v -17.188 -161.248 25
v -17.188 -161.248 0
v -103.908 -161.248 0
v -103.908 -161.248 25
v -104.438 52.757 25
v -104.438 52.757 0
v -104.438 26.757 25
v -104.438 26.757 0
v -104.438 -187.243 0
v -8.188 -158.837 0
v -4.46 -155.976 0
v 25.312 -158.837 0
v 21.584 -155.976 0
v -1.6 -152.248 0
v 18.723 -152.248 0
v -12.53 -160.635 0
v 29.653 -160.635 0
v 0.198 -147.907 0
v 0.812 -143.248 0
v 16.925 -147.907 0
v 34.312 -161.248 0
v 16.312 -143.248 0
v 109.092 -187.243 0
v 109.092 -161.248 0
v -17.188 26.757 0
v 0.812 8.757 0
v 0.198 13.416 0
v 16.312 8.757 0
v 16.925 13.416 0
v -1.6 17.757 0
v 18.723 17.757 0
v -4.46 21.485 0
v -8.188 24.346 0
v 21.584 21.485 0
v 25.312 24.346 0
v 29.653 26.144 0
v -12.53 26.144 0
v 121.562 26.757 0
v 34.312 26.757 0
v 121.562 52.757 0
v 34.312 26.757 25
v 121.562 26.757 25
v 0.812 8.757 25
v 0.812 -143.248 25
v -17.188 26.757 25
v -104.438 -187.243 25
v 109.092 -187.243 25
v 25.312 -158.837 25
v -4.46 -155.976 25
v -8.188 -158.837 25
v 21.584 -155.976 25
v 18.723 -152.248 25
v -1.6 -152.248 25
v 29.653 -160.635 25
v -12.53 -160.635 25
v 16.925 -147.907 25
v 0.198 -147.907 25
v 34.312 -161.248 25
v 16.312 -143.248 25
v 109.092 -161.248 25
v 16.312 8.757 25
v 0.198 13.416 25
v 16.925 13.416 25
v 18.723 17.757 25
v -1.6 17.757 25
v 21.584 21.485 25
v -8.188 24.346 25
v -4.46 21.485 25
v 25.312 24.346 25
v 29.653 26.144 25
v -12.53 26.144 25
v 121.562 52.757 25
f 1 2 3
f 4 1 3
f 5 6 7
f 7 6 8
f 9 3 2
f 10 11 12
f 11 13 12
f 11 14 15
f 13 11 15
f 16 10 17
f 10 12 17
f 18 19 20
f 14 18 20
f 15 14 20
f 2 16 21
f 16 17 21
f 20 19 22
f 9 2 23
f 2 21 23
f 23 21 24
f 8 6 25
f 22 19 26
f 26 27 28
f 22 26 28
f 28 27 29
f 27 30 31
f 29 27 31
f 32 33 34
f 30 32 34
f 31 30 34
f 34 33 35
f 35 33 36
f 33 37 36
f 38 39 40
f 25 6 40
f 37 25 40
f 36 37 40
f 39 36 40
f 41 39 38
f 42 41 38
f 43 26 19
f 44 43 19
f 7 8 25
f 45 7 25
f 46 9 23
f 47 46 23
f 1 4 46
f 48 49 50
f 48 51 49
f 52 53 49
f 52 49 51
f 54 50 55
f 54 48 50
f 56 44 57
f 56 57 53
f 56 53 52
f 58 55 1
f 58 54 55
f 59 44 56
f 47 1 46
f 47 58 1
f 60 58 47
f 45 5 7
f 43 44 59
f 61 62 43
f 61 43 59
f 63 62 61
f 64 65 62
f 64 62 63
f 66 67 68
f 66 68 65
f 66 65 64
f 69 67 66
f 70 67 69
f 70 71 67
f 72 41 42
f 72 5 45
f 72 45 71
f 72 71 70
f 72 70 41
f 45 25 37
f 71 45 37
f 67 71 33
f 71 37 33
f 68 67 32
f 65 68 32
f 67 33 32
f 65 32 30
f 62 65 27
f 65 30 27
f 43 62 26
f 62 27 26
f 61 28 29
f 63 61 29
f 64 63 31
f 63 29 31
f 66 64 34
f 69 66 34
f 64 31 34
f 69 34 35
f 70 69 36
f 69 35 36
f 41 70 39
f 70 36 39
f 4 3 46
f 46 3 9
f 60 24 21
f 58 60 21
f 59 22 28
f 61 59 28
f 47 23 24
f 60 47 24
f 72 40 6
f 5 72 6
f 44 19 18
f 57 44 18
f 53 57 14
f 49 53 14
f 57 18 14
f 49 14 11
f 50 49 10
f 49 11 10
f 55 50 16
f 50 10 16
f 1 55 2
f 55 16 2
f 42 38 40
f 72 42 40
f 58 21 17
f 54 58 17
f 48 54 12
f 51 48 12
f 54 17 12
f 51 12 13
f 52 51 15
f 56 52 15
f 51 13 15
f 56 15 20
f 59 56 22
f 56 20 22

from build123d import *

# Parameters (mm, degrees)
F1_DEPTH = 25


with BuildPart() as f1:
    # F0 (on Top) → F1 (new body)
    with BuildSketch(Plane.XY):
        with BuildLine():
            Line((121.561594, 52.757246), (-104.438406, 52.757246))
            Line((-104.438406, 52.757246), (-104.438406, 26.757246))
            Line((-104.438406, 26.757246), (-17.188406, 26.757246))
            ThreePointArc((-17.188406, 26.757246), (-4.460484, 21.485168), (0.811594, 8.757246))
            Line((0.811594, 8.757246), (0.811594, -143.248167))
            ThreePointArc((0.811594, -143.248167), (-4.460484, -155.976089), (-17.188406, -161.248167))
            Line((-17.188406, -161.248167), (-103.907911, -161.248167))
            Line((-103.907911, -161.248167), (-104.438406, -187.242754))
            Line((-104.438406, -187.242754), (109.092089, -187.242754))
            Line((109.092089, -187.242754), (109.092089, -161.248167))
            Line((109.092089, -161.248167), (34.311594, -161.248167))
            ThreePointArc((34.311594, -161.248167), (21.583672, -155.976089), (16.311594, -143.248167))
            Line((16.311594, -143.248167), (16.311594, 8.757246))
            ThreePointArc((16.311594, 8.757246), (21.583672, 21.485168), (34.311594, 26.757246))
            Line((34.311594, 26.757246), (121.561594, 26.757246))
            Line((121.561594, 26.757246), (121.561594, 52.757246))
        make_face()
    extrude(amount=F1_DEPTH)


solid = f1.part
